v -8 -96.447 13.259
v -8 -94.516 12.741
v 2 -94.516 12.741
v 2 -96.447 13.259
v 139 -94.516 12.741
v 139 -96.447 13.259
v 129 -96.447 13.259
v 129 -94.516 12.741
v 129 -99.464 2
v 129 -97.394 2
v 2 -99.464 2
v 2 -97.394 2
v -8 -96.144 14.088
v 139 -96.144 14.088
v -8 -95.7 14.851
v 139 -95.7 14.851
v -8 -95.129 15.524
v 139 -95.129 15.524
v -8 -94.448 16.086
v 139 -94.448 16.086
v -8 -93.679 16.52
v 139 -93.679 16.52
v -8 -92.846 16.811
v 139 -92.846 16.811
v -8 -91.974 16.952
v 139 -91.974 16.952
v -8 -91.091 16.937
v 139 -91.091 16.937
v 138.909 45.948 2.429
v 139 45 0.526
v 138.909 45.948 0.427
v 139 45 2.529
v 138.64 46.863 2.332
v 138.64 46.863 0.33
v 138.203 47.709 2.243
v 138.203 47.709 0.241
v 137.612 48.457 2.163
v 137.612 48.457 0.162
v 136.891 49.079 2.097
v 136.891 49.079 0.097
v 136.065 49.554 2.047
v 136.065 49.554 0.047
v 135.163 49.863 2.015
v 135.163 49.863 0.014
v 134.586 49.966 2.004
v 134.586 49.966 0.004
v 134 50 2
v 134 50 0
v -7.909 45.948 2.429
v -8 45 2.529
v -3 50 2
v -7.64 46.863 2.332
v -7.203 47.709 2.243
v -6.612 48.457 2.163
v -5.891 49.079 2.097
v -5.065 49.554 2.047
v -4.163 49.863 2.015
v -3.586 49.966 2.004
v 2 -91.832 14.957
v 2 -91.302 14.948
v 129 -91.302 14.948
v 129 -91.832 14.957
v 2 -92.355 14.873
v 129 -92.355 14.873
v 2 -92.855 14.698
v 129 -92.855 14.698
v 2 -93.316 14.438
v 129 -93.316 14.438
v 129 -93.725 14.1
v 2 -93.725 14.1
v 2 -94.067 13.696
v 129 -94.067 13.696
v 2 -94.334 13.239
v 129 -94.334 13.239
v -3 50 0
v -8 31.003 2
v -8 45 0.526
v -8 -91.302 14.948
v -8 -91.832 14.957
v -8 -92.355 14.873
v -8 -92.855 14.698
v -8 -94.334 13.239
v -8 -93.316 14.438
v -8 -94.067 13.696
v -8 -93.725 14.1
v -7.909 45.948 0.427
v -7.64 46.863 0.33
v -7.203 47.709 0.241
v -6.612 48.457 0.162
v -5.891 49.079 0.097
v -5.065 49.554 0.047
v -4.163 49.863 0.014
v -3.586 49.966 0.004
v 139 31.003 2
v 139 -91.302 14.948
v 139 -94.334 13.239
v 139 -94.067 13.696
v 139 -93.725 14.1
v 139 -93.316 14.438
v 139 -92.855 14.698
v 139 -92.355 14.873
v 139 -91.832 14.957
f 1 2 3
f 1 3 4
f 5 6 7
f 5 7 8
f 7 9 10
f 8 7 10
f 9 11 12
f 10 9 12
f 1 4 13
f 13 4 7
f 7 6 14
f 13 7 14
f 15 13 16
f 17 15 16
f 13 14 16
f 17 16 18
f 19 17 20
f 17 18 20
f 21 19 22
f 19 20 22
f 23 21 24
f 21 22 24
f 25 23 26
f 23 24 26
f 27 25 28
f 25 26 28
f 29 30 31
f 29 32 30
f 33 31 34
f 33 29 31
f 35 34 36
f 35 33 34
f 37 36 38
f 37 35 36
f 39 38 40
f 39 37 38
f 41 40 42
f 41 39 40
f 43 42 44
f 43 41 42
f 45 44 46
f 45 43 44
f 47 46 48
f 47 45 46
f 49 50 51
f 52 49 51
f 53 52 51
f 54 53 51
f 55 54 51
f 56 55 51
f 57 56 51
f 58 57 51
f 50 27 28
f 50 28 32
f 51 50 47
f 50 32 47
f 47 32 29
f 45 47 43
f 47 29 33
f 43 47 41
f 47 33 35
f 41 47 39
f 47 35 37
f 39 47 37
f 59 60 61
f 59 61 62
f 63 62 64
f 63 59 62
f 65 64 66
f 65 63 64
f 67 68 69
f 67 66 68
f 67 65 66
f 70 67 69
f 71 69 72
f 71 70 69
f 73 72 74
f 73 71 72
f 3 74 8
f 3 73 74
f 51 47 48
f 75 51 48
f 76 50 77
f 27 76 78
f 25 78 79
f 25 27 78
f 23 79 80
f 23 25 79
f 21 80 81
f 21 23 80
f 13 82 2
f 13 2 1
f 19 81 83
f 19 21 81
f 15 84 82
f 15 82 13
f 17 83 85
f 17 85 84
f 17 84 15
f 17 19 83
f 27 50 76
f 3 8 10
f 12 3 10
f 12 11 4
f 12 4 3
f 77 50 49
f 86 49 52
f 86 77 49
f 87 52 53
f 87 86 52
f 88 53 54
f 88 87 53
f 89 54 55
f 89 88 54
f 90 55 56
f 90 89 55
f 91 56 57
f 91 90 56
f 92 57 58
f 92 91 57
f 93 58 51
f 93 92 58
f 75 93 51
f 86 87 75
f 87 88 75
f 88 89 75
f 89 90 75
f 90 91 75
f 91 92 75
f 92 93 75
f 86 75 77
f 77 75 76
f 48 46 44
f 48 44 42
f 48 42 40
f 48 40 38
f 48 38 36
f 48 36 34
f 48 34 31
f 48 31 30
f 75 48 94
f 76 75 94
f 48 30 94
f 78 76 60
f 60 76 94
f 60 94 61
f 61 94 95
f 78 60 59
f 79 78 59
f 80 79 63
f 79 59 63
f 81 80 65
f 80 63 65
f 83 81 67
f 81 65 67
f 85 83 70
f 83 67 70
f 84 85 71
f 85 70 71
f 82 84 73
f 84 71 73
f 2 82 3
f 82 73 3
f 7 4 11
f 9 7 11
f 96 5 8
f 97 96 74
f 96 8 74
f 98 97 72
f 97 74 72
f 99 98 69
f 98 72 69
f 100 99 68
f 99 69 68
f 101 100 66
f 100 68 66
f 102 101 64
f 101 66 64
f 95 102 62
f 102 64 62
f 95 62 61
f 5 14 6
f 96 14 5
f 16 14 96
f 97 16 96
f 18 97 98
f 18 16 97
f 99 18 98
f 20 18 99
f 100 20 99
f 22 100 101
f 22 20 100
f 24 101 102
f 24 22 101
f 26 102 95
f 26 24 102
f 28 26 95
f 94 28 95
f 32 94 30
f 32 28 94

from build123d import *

# Parameters (mm, degrees)
F3_DEPTH  = 131
F4_T      = -2
F5_DEPTH  = 2
F6_DEPTH  = 2
F7_DEPTH  = 2
F9_DEPTH  = 127
F13_DEPTH = 10
F15_DEPTH = 10
F16_R     = 5


with BuildPart() as f3:
    # F2 (on Right) → F3 (new body)
    with BuildSketch(Plane.YZ):
        with BuildLine():
            ThreePointArc((-91.0913455441, 16.9367446821), (-94.4482121177, 16.0862273851), (-96.4473620115, 13.2586254741))
            Line((-96.4473620115, 13.2586254741), (-100, 0))
            Line((-100, 0), (50, 0))
            Line((50, 0), (50, 2))
            Line((50, 2), (-91.0913455441, 16.9367446821))
        make_face()
    extrude(amount=F3_DEPTH)

    # F4 (hollow: no face is removed)
    offset(amount=F4_T, mode=Mode.SUBTRACT)

    # F5 (cut): a face of the model
    f5_faces = [f3.faces().sort_by_distance(p)[0] for p in [
        (65.5, -25, 0),
    ]]
    extrude(f5_faces, amount=-F5_DEPTH, mode=Mode.SUBTRACT)

    # F6 (cut): a face of the model
    f6_faces = [f3.faces().sort_by_distance(p)[0] for p in [
        (131, -48.1192247529, 7.0991070321),
    ]]
    extrude(f6_faces, amount=-F6_DEPTH, mode=Mode.SUBTRACT)

    # F7 (cut): a face of the model
    f7_faces = [f3.faces().sort_by_distance(p)[0] for p in [
        (0, -48.1192247529, 7.0991070321),
    ]]
    extrude(f7_faces, amount=-F7_DEPTH, mode=Mode.SUBTRACT)


with BuildPart() as f9:
    # F8 (on face) → F9 (new body)
    with BuildSketch(Plane.YZ.offset(129)):
        Polygon((50, 2), (31.0025824745, 2), (50, 0), align=None)
    extrude(amount=-F9_DEPTH)

    # F10: union F3
    add(f3.part)

    # F12 (on face) → F13 (join)
    with BuildSketch(Plane.YZ.offset(129)):
        Polygon((50, 2), (-91.0913455441, 16.9367446821), (-91.3019004785, 14.9478589087), (31.0025824745, 2), (50, 0), align=None)
        with BuildLine():
            ThreePointArc((-91.0913455441, 16.9367446821), (-94.4482121177, 16.0862273851), (-96.4473620115, 13.2586254741))
            Line((-96.4473620115, 13.2586254741), (-94.5155103589, 12.7409873839))
            ThreePointArc((-94.5155103589, 12.7409873839), (-93.3160204226, 14.4375485305), (-91.3019004785, 14.9478589087))
            Line((-91.3019004785, 14.9478589087), (-91.0913455441, 16.9367446821))
        make_face()
    extrude(amount=F13_DEPTH)

    # F14 (on face) → F15 (join)
    with BuildSketch(Plane(origin=(2, 0, 0), x_dir=(0, -1, 0), z_dir=(-1, 0, 0))):
        with BuildLine():
            ThreePointArc((91.3019004785, 14.9478589087), (93.3160204226, 14.4375485305), (94.5155103589, 12.7409873839))
            Line((94.5155103589, 12.7409873839), (96.4473620115, 13.2586254741))
            ThreePointArc((96.4473620115, 13.2586254741), (94.4482121177, 16.0862273851), (91.0913455441, 16.9367446821))
            Line((91.0913455441, 16.9367446821), (-50, 2))
            Line((-50, 2), (-50, 0))
            Line((-50, 0), (-31.0025824745, 2))
            Line((-31.0025824745, 2), (91.3019004785, 14.9478589087))
        make_face()
    extrude(amount=F15_DEPTH)

    # F16
    f16_edges = [f9.edges().sort_by_distance(p)[0] for p in [
        (139, 50, 1),
        (-8, 50, 1),
    ]]
    fillet(f16_edges, radius=F16_R)


solid = f9.part
